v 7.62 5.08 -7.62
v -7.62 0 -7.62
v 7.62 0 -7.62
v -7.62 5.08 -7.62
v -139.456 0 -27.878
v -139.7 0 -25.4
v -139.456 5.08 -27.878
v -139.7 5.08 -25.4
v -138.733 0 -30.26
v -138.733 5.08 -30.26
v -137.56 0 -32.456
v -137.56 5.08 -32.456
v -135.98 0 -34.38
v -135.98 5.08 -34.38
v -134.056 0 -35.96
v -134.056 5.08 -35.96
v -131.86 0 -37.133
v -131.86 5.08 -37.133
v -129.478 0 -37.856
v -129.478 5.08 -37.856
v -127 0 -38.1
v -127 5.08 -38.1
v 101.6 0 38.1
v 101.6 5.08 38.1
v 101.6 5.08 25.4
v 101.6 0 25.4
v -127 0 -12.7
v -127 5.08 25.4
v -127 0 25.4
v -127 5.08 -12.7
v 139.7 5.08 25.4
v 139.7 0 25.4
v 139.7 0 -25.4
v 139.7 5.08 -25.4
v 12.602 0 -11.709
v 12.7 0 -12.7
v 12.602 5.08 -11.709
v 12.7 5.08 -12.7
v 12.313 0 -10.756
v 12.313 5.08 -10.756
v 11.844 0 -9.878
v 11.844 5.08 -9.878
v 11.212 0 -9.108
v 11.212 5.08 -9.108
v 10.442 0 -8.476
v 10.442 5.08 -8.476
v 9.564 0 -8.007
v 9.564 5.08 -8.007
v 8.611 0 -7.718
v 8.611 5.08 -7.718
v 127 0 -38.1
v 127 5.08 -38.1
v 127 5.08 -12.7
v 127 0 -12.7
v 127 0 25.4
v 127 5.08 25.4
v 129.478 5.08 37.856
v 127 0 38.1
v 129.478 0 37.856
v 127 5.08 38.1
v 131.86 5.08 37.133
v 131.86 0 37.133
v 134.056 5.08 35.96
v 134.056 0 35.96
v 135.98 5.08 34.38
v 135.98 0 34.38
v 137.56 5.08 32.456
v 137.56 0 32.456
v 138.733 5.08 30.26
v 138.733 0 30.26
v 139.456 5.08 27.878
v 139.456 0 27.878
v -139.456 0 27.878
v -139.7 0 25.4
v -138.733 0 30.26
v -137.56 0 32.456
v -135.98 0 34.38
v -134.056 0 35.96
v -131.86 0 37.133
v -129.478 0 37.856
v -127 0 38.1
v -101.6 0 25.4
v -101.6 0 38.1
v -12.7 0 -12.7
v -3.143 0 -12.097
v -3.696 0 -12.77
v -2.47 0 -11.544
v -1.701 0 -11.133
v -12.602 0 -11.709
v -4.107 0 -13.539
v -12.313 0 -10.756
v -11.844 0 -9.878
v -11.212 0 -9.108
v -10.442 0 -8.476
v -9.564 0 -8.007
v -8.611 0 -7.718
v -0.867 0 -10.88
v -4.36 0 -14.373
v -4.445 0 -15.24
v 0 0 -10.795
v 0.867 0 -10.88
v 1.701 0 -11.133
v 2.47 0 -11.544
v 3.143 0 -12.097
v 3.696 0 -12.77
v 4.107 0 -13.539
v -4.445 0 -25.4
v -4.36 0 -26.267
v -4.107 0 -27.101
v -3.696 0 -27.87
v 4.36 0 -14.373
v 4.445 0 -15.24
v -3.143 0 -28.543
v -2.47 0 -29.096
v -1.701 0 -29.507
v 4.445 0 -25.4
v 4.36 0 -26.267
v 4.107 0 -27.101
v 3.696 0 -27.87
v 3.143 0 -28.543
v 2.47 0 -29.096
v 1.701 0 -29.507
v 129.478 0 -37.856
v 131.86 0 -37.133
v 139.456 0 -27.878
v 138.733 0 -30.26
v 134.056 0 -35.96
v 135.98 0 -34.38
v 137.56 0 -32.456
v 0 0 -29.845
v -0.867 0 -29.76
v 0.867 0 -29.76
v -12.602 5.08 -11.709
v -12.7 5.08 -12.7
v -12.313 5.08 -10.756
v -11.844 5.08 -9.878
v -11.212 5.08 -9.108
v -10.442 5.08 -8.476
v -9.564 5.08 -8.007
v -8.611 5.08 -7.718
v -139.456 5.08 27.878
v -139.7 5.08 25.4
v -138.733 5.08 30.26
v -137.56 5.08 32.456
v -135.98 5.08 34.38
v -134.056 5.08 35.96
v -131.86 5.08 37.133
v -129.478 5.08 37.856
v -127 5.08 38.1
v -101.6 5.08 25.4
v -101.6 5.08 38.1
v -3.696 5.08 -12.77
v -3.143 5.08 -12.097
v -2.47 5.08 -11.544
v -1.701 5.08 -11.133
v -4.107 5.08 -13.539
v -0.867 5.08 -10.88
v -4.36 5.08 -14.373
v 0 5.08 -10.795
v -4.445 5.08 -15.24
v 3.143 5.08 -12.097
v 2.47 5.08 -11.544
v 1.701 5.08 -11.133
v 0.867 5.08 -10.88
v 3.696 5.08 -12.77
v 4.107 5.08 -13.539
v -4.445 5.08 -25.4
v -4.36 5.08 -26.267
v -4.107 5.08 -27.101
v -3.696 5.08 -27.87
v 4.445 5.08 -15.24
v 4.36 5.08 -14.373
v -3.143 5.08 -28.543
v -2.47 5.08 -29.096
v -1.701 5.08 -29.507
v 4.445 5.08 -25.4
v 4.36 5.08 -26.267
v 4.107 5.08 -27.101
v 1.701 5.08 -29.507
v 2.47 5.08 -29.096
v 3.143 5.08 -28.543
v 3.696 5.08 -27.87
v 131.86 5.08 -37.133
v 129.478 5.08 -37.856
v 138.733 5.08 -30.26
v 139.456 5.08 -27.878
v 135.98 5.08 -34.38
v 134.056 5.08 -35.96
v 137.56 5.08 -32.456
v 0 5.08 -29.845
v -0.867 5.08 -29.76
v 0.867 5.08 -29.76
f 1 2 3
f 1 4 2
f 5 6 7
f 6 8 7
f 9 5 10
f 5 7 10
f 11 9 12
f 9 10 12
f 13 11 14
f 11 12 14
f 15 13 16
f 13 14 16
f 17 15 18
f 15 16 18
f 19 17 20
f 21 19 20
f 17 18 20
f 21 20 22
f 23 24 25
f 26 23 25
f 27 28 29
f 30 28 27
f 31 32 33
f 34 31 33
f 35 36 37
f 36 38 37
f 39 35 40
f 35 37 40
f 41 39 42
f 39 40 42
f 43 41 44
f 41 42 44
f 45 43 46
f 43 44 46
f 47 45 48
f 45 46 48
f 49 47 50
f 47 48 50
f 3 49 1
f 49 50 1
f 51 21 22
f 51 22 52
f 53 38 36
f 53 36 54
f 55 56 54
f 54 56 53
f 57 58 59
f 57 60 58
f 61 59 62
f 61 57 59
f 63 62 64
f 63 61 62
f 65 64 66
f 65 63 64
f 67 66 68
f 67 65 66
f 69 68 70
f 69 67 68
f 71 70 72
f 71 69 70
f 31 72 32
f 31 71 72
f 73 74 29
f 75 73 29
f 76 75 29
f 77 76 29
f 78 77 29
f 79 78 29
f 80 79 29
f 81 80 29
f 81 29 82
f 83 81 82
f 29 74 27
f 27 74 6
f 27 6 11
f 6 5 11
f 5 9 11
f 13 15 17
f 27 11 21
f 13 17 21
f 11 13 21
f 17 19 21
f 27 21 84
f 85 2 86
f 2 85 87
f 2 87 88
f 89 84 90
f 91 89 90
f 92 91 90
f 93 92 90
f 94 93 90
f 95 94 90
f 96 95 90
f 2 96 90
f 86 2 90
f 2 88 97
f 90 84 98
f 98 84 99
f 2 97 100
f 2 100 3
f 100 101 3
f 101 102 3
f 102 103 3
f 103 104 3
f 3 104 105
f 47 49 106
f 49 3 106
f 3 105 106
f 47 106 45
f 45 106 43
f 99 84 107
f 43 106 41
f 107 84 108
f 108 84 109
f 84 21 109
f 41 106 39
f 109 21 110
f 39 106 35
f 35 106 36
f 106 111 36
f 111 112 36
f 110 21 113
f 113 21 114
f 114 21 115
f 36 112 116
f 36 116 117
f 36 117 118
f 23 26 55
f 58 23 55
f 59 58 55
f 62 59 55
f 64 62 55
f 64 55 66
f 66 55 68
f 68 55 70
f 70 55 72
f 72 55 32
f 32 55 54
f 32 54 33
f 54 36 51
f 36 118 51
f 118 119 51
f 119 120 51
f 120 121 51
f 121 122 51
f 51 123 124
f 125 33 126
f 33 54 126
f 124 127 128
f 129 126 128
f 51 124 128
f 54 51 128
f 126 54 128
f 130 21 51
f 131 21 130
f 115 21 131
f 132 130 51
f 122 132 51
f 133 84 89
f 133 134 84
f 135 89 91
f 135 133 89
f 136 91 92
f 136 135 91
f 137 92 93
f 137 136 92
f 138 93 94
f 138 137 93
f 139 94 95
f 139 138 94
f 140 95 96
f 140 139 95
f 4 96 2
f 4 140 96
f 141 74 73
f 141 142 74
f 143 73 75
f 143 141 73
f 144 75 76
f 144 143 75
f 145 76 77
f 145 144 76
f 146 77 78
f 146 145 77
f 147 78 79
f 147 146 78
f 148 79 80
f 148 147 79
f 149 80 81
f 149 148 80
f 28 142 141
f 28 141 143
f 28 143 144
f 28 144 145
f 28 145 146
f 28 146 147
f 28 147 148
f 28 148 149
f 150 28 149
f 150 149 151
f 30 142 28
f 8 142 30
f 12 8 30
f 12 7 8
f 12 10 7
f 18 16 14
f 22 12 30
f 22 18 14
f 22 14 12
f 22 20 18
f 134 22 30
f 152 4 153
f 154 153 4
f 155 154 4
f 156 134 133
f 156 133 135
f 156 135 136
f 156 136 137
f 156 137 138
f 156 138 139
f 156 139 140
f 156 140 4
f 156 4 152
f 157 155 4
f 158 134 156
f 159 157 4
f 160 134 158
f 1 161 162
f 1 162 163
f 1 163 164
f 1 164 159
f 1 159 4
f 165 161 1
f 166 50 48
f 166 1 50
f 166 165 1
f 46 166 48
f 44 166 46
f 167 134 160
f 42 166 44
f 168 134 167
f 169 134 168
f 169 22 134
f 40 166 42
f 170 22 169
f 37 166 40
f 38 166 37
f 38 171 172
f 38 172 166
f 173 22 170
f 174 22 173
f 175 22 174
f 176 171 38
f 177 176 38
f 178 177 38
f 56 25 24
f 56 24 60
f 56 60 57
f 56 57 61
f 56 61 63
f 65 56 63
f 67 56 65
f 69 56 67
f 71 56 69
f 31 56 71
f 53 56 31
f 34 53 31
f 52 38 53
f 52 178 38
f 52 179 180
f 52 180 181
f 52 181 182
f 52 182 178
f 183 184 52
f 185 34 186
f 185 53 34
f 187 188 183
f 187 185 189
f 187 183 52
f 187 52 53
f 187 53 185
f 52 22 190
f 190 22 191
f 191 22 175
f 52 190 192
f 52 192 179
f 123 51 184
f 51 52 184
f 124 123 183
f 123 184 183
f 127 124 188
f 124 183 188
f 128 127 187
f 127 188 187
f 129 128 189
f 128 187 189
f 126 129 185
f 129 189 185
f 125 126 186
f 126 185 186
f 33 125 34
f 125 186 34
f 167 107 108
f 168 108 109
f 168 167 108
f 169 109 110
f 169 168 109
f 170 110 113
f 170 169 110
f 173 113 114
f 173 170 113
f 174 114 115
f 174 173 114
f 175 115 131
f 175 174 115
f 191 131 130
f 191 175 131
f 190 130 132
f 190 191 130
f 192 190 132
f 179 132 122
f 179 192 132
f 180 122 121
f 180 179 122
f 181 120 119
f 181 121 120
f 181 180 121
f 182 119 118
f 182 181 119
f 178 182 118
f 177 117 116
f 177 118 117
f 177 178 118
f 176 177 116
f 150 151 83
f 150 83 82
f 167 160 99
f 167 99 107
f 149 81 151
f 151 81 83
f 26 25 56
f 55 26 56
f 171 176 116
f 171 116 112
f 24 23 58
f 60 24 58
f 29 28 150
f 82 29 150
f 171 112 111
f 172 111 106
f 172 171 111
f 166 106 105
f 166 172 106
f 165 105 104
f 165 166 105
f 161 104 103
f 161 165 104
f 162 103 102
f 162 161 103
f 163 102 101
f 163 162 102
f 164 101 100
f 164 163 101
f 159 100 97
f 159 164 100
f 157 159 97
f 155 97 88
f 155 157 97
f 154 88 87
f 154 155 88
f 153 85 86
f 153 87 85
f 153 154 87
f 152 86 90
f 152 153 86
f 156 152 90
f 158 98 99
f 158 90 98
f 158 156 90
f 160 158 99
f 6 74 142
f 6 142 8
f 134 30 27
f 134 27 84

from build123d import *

# Parameters (mm, degrees)
SKETCH1_W           = 279.4
SKETCH1_H           = 76.2
BOSS_EXTRUDE1_DEPTH = 5.08
SKETCH2_W           = 254
SKETCH2_H           = 38.1
CUT_EXTRUDE1_DEPTH  = 145.891360681
FILLET1_R           = 12.7
FILLET2_R           = 12.7
SKETCH4_W           = 203.2
SKETCH4_H           = 12.7
CUT_EXTRUDE2_DEPTH  = 145.891360681
SKETCH5_W           = 25.4
SKETCH5_H           = 5.08
BOSS_EXTRUDE2_DEPTH = 5.08
FILLET3_R           = 5.08
CUT_EXTRUDE4_DEPTH  = 145.891360681


with BuildPart() as part:
    # Sketch1 → Boss-Extrude1 (new body)
    with BuildSketch(Plane(origin=(0, 0, 0), x_dir=(1, 0, 0), z_dir=(0, 1, 0))):
        Rectangle(SKETCH1_W, SKETCH1_H)
    extrude(amount=BOSS_EXTRUDE1_DEPTH)

    # Sketch2 → Cut-Extrude1 (cut, through all)
    with BuildSketch(Plane(origin=(0, 5.08, 0), x_dir=(1, 0, 0), z_dir=(0, 1, 0))):
        with Locations((0, -6.35)):
            Rectangle(SKETCH2_W, SKETCH2_H)
    extrude(amount=-CUT_EXTRUDE1_DEPTH, mode=Mode.SUBTRACT)

    # Fillet1
    fillet1_edges = [part.edges().sort_by_distance(p)[0] for p in [
        (-139.7, 2.54, -38.1),
        (139.7, 2.54, -38.1),
    ]]
    fillet(fillet1_edges, radius=FILLET1_R)

    # Fillet2
    fillet2_edges = [part.edges().sort_by_distance(p)[0] for p in [
        (139.7, 2.54, 38.1),
        (-139.7, 2.54, 38.1),
    ]]
    fillet(fillet2_edges, radius=FILLET2_R)

    # Sketch4 → Cut-Extrude2 (cut, through all)
    with BuildSketch(Plane(origin=(0, 5.08, 0), x_dir=(1, 0, 0), z_dir=(0, 1, 0))):
        with Locations((0, -31.75)):
            Rectangle(SKETCH4_W, SKETCH4_H)
    extrude(amount=-CUT_EXTRUDE2_DEPTH, mode=Mode.SUBTRACT)

    # Sketch5 → Boss-Extrude2 (add)
    with BuildSketch(Plane.XY.offset(-12.7)):
        with Locations((0, 2.54)):
            Rectangle(SKETCH5_W, SKETCH5_H)
    extrude(amount=BOSS_EXTRUDE2_DEPTH)

    # Fillet3
    fillet3_edges = [part.edges().sort_by_distance(p)[0] for p in [
        (-12.7, 2.54, -7.62),
        (12.7, 2.54, -7.62),
    ]]
    fillet(fillet3_edges, radius=FILLET3_R - 0.0001)  # a hair under: the kernel refuses the full size

    # Sketch6 → Cut-Extrude4 (cut, through all)
    with BuildSketch(Plane(origin=(0, 5.08, 0), x_dir=(1, 0, 0), z_dir=(0, 1, 0))):
        with BuildLine():
            Line((-4.445, 15.24), (-4.445, 25.4))
            ThreePointArc((-4.445, 25.4), (0, 29.845), (4.445, 25.4))
            Line((4.445, 25.4), (4.445, 15.24))
            ThreePointArc((4.445, 15.24), (0, 10.795), (-4.445, 15.24))
        make_face()
    extrude(amount=-CUT_EXTRUDE4_DEPTH, mode=Mode.SUBTRACT)


solid = part.part
